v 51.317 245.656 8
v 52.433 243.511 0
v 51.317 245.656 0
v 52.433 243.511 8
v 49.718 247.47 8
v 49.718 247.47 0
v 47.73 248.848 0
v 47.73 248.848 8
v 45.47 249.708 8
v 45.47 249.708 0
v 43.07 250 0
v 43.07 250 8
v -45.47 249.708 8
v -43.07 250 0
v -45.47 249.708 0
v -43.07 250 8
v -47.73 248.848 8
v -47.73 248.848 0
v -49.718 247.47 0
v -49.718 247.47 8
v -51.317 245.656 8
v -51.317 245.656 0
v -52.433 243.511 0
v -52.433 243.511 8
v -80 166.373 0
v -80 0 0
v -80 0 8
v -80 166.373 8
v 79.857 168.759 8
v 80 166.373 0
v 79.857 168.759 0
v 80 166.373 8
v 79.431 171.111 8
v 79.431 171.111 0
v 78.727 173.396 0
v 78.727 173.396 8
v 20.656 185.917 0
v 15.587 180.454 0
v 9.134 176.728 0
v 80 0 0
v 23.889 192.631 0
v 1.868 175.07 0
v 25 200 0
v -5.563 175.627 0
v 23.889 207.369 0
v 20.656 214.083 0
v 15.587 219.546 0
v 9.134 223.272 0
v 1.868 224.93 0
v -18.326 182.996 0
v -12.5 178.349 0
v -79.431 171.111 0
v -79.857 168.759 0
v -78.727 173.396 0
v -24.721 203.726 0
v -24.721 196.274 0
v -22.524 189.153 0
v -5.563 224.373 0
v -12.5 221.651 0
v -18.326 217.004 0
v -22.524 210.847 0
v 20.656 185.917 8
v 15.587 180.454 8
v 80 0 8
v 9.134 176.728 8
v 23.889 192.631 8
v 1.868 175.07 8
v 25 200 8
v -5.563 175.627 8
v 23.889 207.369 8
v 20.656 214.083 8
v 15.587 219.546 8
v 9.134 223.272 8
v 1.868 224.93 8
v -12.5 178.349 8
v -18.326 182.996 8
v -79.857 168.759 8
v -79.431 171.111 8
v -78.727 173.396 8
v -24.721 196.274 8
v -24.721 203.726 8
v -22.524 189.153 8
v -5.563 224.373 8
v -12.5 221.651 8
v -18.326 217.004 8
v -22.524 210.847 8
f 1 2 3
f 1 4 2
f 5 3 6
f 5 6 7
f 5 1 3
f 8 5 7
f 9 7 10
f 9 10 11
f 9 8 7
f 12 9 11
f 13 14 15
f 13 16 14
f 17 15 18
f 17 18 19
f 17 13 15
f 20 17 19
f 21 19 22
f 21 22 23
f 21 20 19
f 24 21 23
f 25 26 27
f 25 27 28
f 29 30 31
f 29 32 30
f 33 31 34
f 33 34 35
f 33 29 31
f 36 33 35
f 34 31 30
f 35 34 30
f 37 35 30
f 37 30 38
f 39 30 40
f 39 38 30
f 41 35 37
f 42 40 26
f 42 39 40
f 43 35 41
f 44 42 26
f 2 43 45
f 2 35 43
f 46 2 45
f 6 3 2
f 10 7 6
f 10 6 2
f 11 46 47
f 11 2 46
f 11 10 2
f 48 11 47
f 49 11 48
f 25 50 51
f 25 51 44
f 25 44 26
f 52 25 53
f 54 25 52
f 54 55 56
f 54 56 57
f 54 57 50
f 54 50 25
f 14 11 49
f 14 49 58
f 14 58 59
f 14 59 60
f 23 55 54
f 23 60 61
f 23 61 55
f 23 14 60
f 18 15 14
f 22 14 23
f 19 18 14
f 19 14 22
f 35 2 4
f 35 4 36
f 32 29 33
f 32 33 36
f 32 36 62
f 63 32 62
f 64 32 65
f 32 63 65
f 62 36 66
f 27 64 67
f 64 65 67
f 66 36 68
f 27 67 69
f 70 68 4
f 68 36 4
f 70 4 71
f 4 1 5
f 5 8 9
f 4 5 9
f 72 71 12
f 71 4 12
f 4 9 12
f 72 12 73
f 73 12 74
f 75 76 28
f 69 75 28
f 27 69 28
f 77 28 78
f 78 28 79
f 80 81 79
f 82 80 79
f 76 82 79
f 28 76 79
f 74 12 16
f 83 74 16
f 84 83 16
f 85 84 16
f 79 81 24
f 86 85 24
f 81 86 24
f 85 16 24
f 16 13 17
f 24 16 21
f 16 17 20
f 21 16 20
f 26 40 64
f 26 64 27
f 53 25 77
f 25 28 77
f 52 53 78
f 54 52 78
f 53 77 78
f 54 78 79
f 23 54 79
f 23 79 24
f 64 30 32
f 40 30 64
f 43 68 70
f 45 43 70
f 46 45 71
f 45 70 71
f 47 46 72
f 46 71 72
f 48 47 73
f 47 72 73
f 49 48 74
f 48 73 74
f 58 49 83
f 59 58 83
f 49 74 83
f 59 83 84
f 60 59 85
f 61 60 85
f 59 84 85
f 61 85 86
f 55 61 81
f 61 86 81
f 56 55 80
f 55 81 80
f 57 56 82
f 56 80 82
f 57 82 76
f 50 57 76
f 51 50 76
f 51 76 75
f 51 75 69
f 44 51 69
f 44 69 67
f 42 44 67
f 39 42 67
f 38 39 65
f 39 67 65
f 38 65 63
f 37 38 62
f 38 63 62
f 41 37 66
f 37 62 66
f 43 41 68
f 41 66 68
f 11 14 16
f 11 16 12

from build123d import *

# Parameters (mm, degrees)
BOSS_EXTRUDE1_DEPTH = 8
SKETCH4_R           = 25
CUT_EXTRUDE1_DEPTH  = 8
FILLET2_R           = 20
FILLET4_R           = 20
FILLET5_R           = 10


with BuildPart() as part:
    # Sketch2 → Boss-Extrude1 (new body)
    with BuildSketch(Plane.XY):
        Polygon((-80, 0), (-80, 170), (-50, 250), (50, 250), (80, 170), (80, 0), align=None)
    extrude(amount=BOSS_EXTRUDE1_DEPTH)

    # Sketch4 → Cut-Extrude1 (cut)
    with BuildSketch(Plane.XY.offset(8)):
        with Locations((0, 200)):
            Circle(SKETCH4_R)
    extrude(amount=-CUT_EXTRUDE1_DEPTH, mode=Mode.SUBTRACT)

    # Fillet2
    fillet2_edges = [part.edges().sort_by_distance(p)[0] for p in [
        (-80, 170, 4),
    ]]
    fillet(fillet2_edges, radius=FILLET2_R)

    # Fillet4
    fillet4_edges = [part.edges().sort_by_distance(p)[0] for p in [
        (80, 170, 4),
    ]]
    fillet(fillet4_edges, radius=FILLET4_R)

    # Fillet5
    fillet5_edges = [part.edges().sort_by_distance(p)[0] for p in [
        (-50, 250, 4),
        (50, 250, 4),
    ]]
    fillet(fillet5_edges, radius=FILLET5_R)


solid = part.part
